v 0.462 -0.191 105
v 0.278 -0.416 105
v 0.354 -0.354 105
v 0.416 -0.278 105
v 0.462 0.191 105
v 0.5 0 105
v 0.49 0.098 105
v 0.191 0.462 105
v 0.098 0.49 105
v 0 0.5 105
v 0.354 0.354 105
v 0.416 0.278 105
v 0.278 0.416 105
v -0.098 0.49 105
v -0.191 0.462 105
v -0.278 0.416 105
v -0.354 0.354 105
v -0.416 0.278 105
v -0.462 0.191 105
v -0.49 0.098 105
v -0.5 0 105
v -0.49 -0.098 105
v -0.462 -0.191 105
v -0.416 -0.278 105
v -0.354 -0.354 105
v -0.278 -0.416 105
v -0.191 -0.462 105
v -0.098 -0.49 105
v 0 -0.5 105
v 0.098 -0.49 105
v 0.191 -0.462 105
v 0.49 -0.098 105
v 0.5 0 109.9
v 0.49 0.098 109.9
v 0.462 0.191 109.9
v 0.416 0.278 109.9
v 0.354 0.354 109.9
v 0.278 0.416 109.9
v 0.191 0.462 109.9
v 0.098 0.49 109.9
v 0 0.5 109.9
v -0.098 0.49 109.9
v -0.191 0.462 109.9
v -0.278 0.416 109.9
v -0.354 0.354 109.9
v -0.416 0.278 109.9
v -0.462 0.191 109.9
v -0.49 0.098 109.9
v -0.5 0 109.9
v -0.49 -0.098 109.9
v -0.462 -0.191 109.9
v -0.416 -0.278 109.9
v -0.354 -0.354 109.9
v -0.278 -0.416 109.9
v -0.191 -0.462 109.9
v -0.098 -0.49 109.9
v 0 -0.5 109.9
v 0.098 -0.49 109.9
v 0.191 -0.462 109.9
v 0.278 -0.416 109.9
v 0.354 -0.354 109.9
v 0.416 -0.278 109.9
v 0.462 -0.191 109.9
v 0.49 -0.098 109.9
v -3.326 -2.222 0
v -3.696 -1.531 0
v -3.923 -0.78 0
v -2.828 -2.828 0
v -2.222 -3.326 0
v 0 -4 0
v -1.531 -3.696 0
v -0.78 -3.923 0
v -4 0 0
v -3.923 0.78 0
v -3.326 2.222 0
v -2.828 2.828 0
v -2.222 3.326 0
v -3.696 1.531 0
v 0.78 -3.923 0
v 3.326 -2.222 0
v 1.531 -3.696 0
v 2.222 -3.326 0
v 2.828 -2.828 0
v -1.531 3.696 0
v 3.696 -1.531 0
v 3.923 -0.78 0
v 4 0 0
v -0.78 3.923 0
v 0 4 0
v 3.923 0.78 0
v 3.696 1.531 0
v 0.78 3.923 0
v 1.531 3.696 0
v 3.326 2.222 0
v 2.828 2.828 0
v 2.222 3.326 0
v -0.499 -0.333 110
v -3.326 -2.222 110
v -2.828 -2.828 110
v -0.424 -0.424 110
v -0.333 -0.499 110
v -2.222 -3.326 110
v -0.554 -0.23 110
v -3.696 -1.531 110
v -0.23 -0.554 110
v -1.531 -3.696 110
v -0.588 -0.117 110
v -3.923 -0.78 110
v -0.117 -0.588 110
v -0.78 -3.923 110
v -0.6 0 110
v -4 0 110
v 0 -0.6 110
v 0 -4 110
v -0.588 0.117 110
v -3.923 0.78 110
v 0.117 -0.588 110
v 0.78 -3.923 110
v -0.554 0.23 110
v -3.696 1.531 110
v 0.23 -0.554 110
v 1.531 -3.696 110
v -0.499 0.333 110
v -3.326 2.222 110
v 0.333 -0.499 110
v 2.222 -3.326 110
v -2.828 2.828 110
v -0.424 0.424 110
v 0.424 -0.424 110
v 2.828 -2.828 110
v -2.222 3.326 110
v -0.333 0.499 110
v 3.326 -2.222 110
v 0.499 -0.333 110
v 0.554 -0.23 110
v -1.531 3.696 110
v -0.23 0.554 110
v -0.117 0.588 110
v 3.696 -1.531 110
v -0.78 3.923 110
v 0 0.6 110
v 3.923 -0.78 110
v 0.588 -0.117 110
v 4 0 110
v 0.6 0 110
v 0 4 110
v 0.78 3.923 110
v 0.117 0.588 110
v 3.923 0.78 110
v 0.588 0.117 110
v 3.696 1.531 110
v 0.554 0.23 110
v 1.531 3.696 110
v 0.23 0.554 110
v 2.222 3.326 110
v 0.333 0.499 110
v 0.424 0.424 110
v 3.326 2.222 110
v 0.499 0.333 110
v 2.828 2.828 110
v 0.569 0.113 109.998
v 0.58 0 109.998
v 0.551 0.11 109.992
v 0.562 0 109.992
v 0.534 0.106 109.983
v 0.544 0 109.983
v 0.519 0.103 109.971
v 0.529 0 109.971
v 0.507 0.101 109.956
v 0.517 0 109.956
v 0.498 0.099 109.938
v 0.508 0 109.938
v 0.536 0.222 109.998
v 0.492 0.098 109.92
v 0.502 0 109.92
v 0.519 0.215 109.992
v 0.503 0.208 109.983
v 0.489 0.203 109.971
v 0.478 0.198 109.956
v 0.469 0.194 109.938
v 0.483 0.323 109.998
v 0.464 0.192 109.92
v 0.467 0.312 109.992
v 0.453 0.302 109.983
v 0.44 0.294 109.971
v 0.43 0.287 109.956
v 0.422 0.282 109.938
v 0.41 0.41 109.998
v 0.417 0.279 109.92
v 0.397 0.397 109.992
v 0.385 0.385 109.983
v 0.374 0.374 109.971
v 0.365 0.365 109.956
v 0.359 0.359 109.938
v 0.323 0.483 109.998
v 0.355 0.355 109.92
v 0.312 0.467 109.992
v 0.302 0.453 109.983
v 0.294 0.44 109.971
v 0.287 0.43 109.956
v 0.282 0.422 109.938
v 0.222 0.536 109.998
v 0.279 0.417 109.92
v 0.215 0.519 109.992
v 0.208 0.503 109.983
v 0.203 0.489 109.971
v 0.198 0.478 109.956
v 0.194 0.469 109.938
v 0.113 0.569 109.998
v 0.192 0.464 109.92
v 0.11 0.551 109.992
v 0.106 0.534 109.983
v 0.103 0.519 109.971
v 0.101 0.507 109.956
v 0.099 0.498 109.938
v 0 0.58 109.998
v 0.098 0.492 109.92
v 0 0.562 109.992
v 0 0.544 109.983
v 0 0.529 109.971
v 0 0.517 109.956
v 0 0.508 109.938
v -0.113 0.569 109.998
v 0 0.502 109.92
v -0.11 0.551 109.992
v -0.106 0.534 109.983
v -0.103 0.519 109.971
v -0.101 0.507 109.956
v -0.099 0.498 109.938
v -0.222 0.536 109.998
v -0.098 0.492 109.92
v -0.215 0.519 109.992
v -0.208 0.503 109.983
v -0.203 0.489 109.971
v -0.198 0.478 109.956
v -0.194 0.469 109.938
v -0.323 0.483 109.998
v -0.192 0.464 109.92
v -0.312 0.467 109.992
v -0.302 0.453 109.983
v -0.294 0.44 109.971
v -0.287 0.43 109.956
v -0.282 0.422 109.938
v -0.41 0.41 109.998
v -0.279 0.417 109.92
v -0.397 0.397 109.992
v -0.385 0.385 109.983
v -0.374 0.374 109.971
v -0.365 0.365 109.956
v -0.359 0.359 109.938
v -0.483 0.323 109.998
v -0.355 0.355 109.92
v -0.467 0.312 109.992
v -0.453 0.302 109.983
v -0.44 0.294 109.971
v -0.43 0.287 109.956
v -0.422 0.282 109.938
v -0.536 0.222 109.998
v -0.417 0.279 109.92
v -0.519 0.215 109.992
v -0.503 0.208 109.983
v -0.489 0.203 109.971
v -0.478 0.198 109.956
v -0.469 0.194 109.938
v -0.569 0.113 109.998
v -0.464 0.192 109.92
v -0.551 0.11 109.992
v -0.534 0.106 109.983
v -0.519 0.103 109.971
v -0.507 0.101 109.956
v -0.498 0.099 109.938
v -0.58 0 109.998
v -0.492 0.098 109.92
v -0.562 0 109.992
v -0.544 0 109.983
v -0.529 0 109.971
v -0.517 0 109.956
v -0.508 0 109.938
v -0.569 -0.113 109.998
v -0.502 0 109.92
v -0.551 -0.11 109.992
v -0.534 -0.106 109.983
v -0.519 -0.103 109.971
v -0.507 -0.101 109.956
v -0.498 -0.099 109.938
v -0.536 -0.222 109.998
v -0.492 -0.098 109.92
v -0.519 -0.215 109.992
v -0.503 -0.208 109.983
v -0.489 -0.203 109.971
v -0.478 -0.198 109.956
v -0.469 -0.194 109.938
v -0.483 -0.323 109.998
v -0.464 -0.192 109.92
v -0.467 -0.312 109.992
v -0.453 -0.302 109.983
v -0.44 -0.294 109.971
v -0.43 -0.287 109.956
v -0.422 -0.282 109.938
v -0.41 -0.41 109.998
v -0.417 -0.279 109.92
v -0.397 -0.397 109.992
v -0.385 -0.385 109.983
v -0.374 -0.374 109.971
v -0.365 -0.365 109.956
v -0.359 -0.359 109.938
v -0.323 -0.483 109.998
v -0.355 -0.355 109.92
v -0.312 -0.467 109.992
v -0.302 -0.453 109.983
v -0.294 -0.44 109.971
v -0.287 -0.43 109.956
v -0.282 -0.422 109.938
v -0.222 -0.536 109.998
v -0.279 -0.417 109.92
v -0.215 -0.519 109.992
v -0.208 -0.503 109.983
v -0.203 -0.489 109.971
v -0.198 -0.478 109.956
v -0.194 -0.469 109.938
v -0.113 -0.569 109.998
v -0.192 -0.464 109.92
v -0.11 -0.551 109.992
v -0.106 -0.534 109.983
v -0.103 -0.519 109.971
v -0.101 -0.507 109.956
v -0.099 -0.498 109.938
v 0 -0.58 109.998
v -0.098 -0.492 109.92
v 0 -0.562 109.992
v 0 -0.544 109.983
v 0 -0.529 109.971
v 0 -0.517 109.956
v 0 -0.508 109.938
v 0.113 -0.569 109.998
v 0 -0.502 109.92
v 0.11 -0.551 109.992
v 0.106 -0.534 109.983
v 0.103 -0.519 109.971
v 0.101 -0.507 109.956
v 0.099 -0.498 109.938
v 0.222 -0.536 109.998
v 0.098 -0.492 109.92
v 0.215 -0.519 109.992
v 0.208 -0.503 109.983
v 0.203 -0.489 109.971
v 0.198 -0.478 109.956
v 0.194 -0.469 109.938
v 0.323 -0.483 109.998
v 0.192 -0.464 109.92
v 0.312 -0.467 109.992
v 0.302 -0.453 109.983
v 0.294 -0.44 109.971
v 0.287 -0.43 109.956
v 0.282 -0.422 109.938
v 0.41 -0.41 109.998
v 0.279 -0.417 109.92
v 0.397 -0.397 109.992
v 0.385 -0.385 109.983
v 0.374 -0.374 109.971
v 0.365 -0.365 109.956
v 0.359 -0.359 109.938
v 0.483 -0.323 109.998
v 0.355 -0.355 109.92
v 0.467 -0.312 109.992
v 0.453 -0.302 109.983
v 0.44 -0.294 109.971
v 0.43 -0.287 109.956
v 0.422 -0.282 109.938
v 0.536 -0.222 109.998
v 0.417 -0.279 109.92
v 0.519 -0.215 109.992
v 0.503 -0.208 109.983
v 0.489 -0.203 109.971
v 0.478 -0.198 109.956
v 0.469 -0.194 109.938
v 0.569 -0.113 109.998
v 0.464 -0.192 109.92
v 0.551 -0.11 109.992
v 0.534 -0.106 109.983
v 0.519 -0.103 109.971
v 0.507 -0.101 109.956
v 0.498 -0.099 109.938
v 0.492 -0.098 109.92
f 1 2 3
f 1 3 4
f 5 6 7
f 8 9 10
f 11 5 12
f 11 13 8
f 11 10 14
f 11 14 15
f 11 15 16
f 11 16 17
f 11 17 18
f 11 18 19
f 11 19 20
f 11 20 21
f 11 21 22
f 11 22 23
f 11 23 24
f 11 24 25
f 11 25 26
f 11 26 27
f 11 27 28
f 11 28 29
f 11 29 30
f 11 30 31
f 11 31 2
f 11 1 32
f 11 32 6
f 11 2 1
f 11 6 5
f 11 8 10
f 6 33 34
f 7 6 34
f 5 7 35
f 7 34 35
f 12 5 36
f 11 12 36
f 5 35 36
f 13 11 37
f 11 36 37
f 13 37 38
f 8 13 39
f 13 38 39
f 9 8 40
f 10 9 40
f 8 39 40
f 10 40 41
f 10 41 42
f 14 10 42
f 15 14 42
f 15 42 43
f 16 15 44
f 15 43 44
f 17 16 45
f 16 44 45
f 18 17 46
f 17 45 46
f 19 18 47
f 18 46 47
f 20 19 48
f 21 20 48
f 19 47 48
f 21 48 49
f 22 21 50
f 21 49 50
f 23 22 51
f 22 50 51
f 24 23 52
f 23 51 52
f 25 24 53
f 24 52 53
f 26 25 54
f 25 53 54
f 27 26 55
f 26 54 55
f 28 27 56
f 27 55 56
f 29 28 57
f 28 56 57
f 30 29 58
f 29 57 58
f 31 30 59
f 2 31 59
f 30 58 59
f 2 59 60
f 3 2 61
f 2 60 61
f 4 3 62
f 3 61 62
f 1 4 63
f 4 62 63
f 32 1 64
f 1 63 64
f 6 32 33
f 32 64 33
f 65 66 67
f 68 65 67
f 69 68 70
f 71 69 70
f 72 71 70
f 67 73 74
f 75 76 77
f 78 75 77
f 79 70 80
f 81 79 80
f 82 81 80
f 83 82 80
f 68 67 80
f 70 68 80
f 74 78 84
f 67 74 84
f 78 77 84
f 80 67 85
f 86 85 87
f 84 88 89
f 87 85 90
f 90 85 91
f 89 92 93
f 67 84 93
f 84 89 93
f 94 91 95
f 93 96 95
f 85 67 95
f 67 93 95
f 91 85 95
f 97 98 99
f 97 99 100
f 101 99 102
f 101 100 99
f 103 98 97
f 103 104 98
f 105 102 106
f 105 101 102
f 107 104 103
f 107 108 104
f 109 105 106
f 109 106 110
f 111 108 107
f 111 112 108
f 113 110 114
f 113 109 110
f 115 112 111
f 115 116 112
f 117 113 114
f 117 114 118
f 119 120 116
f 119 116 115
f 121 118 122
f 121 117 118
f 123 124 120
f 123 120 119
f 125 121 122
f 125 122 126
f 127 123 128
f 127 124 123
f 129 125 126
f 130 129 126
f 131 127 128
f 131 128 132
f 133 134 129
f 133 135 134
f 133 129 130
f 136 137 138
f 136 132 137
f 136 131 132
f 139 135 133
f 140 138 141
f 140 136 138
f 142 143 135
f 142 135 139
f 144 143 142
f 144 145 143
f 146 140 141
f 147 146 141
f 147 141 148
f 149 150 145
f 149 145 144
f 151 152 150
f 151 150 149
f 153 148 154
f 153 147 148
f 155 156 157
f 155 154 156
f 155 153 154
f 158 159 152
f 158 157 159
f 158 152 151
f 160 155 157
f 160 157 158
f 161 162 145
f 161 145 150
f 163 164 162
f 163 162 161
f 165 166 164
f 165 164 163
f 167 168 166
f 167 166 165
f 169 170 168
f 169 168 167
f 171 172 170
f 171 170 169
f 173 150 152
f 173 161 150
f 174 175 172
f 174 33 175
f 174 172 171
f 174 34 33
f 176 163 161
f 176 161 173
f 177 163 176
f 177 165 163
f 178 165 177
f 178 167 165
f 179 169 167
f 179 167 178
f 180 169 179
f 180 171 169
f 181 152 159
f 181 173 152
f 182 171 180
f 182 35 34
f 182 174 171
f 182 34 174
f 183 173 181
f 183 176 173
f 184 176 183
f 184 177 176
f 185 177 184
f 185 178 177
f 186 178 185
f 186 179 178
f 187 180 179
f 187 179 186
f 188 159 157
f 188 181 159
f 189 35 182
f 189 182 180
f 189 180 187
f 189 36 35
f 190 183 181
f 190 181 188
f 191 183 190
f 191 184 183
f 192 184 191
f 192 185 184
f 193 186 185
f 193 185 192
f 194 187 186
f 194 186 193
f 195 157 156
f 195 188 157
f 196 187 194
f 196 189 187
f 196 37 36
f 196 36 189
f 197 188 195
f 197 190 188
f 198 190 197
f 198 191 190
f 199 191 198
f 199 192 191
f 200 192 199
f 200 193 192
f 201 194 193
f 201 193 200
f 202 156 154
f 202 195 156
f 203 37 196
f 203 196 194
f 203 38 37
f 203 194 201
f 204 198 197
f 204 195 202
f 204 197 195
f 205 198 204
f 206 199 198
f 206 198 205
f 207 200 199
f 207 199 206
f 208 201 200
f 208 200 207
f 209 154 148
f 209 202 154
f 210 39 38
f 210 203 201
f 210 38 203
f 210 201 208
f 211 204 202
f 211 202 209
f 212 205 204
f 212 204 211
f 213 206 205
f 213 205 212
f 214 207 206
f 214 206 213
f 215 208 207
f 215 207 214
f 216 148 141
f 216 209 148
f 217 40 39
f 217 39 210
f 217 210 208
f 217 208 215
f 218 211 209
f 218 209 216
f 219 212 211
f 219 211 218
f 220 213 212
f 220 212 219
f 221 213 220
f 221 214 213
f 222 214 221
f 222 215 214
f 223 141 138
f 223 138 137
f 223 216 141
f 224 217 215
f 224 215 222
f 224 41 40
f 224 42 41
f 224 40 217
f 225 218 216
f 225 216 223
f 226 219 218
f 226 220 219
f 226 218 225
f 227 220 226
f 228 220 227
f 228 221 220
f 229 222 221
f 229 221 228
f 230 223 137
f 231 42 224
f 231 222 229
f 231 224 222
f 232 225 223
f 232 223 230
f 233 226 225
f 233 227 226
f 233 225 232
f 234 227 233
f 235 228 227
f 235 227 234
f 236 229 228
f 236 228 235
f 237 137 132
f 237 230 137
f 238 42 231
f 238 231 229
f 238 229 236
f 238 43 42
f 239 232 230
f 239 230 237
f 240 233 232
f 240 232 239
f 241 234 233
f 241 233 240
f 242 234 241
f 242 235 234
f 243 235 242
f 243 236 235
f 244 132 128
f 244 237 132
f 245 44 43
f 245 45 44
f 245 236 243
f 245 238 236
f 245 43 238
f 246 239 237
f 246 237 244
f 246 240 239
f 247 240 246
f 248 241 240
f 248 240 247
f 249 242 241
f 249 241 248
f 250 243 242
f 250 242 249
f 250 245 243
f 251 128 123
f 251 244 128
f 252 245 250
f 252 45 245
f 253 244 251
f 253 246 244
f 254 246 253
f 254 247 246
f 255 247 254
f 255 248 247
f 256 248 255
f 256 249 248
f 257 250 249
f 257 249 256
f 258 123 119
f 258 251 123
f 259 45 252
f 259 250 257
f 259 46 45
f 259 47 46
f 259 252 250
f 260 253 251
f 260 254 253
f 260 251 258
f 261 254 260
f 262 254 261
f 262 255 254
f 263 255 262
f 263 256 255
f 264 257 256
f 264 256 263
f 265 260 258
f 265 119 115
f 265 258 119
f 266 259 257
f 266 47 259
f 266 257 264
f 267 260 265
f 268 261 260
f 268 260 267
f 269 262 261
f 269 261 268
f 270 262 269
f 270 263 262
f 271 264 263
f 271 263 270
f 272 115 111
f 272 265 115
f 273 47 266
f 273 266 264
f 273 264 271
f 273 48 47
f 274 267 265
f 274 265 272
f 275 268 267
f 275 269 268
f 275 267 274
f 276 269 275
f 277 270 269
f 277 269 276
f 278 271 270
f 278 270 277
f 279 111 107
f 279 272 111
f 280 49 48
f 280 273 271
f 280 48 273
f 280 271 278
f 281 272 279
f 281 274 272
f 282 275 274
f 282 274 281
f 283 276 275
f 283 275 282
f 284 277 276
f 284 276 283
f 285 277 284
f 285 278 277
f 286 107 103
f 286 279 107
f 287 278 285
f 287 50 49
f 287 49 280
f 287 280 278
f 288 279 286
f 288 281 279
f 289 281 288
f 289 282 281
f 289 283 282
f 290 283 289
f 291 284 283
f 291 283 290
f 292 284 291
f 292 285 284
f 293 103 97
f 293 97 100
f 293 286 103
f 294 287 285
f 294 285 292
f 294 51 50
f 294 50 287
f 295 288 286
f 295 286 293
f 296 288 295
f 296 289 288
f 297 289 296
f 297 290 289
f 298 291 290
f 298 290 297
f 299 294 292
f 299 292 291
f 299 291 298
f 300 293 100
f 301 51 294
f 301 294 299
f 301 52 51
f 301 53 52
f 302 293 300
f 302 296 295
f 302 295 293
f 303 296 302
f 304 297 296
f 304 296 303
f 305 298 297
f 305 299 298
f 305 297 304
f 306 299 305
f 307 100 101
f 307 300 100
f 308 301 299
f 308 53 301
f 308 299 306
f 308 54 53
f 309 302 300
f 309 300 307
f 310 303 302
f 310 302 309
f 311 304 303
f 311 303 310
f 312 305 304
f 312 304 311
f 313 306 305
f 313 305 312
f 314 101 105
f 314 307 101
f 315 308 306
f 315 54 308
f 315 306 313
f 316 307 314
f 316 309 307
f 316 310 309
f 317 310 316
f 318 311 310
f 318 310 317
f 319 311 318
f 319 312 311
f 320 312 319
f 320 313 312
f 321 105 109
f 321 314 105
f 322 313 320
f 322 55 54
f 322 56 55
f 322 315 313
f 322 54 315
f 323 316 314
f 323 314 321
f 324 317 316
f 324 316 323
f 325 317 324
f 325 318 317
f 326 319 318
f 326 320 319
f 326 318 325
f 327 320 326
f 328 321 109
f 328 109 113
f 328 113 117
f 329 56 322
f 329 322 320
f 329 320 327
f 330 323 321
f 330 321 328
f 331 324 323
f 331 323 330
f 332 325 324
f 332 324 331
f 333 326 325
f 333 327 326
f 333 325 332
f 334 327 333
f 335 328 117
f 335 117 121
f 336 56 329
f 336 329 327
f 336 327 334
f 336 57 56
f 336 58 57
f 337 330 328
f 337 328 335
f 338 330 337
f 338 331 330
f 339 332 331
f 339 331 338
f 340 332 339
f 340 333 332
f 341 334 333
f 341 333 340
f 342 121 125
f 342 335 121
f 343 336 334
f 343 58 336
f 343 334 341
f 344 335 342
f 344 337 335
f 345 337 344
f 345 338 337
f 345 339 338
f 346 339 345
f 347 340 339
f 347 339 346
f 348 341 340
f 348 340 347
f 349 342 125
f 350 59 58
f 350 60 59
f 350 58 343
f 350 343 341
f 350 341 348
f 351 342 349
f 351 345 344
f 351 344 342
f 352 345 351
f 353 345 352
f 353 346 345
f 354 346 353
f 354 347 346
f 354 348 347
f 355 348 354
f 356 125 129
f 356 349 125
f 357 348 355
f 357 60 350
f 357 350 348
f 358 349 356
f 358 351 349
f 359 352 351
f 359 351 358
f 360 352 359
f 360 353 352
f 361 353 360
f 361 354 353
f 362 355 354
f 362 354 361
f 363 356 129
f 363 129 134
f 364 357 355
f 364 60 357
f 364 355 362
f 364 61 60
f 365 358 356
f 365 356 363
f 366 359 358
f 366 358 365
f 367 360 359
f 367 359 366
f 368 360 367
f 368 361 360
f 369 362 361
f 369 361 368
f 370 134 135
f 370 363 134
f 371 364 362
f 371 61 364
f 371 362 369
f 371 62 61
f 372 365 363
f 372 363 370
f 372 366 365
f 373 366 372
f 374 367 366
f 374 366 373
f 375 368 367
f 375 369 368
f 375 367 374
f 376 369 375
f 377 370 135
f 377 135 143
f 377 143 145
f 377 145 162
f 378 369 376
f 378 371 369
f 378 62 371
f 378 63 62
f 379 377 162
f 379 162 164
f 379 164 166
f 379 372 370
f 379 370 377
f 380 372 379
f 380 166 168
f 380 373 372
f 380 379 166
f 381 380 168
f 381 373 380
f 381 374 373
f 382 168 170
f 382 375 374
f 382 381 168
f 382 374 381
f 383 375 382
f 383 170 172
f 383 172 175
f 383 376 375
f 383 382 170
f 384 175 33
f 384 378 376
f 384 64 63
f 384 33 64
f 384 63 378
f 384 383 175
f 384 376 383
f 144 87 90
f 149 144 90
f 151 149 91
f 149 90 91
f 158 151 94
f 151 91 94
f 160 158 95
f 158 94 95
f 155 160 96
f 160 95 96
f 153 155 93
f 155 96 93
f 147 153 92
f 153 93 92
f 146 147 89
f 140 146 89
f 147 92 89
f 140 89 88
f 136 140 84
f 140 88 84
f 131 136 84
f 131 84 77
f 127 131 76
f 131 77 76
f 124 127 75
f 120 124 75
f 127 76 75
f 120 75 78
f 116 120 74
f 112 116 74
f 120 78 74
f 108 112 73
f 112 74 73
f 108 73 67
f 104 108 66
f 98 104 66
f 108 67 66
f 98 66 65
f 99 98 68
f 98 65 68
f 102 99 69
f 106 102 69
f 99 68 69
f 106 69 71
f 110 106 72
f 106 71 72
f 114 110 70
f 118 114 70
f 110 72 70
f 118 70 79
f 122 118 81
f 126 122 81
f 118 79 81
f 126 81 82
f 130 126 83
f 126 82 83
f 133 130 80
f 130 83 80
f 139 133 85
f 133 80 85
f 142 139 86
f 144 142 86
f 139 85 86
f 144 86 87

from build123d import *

# Parameters (mm, degrees)
IZIM1_R                     = 4
Y_KSEKLIK_EKSTR_ZYON1_DEPTH = 110
IZIM2_R                     = 0.5
KES_EKSTR_ZYON1_DEPTH       = 5
RADYUS1_R                   = 0.1


with BuildPart() as part:
    # Çizim1 → Yükseklik-Ekstrüzyon1 (new body)
    with BuildSketch(Plane.XY):
        Circle(IZIM1_R)
    extrude(amount=Y_KSEKLIK_EKSTR_ZYON1_DEPTH)

    # Çizim2 → Kes-Ekstrüzyon1 (cut)
    with BuildSketch(Plane.XY.offset(110)):
        Circle(IZIM2_R)
    extrude(amount=-KES_EKSTR_ZYON1_DEPTH, mode=Mode.SUBTRACT)

    # Radyus1
    radyus1_edges = [part.edges().sort_by_distance(p)[0] for p in [
        (-0.5, 0, 110),
    ]]
    fillet(radyus1_edges, radius=RADYUS1_R)


solid = part.part
